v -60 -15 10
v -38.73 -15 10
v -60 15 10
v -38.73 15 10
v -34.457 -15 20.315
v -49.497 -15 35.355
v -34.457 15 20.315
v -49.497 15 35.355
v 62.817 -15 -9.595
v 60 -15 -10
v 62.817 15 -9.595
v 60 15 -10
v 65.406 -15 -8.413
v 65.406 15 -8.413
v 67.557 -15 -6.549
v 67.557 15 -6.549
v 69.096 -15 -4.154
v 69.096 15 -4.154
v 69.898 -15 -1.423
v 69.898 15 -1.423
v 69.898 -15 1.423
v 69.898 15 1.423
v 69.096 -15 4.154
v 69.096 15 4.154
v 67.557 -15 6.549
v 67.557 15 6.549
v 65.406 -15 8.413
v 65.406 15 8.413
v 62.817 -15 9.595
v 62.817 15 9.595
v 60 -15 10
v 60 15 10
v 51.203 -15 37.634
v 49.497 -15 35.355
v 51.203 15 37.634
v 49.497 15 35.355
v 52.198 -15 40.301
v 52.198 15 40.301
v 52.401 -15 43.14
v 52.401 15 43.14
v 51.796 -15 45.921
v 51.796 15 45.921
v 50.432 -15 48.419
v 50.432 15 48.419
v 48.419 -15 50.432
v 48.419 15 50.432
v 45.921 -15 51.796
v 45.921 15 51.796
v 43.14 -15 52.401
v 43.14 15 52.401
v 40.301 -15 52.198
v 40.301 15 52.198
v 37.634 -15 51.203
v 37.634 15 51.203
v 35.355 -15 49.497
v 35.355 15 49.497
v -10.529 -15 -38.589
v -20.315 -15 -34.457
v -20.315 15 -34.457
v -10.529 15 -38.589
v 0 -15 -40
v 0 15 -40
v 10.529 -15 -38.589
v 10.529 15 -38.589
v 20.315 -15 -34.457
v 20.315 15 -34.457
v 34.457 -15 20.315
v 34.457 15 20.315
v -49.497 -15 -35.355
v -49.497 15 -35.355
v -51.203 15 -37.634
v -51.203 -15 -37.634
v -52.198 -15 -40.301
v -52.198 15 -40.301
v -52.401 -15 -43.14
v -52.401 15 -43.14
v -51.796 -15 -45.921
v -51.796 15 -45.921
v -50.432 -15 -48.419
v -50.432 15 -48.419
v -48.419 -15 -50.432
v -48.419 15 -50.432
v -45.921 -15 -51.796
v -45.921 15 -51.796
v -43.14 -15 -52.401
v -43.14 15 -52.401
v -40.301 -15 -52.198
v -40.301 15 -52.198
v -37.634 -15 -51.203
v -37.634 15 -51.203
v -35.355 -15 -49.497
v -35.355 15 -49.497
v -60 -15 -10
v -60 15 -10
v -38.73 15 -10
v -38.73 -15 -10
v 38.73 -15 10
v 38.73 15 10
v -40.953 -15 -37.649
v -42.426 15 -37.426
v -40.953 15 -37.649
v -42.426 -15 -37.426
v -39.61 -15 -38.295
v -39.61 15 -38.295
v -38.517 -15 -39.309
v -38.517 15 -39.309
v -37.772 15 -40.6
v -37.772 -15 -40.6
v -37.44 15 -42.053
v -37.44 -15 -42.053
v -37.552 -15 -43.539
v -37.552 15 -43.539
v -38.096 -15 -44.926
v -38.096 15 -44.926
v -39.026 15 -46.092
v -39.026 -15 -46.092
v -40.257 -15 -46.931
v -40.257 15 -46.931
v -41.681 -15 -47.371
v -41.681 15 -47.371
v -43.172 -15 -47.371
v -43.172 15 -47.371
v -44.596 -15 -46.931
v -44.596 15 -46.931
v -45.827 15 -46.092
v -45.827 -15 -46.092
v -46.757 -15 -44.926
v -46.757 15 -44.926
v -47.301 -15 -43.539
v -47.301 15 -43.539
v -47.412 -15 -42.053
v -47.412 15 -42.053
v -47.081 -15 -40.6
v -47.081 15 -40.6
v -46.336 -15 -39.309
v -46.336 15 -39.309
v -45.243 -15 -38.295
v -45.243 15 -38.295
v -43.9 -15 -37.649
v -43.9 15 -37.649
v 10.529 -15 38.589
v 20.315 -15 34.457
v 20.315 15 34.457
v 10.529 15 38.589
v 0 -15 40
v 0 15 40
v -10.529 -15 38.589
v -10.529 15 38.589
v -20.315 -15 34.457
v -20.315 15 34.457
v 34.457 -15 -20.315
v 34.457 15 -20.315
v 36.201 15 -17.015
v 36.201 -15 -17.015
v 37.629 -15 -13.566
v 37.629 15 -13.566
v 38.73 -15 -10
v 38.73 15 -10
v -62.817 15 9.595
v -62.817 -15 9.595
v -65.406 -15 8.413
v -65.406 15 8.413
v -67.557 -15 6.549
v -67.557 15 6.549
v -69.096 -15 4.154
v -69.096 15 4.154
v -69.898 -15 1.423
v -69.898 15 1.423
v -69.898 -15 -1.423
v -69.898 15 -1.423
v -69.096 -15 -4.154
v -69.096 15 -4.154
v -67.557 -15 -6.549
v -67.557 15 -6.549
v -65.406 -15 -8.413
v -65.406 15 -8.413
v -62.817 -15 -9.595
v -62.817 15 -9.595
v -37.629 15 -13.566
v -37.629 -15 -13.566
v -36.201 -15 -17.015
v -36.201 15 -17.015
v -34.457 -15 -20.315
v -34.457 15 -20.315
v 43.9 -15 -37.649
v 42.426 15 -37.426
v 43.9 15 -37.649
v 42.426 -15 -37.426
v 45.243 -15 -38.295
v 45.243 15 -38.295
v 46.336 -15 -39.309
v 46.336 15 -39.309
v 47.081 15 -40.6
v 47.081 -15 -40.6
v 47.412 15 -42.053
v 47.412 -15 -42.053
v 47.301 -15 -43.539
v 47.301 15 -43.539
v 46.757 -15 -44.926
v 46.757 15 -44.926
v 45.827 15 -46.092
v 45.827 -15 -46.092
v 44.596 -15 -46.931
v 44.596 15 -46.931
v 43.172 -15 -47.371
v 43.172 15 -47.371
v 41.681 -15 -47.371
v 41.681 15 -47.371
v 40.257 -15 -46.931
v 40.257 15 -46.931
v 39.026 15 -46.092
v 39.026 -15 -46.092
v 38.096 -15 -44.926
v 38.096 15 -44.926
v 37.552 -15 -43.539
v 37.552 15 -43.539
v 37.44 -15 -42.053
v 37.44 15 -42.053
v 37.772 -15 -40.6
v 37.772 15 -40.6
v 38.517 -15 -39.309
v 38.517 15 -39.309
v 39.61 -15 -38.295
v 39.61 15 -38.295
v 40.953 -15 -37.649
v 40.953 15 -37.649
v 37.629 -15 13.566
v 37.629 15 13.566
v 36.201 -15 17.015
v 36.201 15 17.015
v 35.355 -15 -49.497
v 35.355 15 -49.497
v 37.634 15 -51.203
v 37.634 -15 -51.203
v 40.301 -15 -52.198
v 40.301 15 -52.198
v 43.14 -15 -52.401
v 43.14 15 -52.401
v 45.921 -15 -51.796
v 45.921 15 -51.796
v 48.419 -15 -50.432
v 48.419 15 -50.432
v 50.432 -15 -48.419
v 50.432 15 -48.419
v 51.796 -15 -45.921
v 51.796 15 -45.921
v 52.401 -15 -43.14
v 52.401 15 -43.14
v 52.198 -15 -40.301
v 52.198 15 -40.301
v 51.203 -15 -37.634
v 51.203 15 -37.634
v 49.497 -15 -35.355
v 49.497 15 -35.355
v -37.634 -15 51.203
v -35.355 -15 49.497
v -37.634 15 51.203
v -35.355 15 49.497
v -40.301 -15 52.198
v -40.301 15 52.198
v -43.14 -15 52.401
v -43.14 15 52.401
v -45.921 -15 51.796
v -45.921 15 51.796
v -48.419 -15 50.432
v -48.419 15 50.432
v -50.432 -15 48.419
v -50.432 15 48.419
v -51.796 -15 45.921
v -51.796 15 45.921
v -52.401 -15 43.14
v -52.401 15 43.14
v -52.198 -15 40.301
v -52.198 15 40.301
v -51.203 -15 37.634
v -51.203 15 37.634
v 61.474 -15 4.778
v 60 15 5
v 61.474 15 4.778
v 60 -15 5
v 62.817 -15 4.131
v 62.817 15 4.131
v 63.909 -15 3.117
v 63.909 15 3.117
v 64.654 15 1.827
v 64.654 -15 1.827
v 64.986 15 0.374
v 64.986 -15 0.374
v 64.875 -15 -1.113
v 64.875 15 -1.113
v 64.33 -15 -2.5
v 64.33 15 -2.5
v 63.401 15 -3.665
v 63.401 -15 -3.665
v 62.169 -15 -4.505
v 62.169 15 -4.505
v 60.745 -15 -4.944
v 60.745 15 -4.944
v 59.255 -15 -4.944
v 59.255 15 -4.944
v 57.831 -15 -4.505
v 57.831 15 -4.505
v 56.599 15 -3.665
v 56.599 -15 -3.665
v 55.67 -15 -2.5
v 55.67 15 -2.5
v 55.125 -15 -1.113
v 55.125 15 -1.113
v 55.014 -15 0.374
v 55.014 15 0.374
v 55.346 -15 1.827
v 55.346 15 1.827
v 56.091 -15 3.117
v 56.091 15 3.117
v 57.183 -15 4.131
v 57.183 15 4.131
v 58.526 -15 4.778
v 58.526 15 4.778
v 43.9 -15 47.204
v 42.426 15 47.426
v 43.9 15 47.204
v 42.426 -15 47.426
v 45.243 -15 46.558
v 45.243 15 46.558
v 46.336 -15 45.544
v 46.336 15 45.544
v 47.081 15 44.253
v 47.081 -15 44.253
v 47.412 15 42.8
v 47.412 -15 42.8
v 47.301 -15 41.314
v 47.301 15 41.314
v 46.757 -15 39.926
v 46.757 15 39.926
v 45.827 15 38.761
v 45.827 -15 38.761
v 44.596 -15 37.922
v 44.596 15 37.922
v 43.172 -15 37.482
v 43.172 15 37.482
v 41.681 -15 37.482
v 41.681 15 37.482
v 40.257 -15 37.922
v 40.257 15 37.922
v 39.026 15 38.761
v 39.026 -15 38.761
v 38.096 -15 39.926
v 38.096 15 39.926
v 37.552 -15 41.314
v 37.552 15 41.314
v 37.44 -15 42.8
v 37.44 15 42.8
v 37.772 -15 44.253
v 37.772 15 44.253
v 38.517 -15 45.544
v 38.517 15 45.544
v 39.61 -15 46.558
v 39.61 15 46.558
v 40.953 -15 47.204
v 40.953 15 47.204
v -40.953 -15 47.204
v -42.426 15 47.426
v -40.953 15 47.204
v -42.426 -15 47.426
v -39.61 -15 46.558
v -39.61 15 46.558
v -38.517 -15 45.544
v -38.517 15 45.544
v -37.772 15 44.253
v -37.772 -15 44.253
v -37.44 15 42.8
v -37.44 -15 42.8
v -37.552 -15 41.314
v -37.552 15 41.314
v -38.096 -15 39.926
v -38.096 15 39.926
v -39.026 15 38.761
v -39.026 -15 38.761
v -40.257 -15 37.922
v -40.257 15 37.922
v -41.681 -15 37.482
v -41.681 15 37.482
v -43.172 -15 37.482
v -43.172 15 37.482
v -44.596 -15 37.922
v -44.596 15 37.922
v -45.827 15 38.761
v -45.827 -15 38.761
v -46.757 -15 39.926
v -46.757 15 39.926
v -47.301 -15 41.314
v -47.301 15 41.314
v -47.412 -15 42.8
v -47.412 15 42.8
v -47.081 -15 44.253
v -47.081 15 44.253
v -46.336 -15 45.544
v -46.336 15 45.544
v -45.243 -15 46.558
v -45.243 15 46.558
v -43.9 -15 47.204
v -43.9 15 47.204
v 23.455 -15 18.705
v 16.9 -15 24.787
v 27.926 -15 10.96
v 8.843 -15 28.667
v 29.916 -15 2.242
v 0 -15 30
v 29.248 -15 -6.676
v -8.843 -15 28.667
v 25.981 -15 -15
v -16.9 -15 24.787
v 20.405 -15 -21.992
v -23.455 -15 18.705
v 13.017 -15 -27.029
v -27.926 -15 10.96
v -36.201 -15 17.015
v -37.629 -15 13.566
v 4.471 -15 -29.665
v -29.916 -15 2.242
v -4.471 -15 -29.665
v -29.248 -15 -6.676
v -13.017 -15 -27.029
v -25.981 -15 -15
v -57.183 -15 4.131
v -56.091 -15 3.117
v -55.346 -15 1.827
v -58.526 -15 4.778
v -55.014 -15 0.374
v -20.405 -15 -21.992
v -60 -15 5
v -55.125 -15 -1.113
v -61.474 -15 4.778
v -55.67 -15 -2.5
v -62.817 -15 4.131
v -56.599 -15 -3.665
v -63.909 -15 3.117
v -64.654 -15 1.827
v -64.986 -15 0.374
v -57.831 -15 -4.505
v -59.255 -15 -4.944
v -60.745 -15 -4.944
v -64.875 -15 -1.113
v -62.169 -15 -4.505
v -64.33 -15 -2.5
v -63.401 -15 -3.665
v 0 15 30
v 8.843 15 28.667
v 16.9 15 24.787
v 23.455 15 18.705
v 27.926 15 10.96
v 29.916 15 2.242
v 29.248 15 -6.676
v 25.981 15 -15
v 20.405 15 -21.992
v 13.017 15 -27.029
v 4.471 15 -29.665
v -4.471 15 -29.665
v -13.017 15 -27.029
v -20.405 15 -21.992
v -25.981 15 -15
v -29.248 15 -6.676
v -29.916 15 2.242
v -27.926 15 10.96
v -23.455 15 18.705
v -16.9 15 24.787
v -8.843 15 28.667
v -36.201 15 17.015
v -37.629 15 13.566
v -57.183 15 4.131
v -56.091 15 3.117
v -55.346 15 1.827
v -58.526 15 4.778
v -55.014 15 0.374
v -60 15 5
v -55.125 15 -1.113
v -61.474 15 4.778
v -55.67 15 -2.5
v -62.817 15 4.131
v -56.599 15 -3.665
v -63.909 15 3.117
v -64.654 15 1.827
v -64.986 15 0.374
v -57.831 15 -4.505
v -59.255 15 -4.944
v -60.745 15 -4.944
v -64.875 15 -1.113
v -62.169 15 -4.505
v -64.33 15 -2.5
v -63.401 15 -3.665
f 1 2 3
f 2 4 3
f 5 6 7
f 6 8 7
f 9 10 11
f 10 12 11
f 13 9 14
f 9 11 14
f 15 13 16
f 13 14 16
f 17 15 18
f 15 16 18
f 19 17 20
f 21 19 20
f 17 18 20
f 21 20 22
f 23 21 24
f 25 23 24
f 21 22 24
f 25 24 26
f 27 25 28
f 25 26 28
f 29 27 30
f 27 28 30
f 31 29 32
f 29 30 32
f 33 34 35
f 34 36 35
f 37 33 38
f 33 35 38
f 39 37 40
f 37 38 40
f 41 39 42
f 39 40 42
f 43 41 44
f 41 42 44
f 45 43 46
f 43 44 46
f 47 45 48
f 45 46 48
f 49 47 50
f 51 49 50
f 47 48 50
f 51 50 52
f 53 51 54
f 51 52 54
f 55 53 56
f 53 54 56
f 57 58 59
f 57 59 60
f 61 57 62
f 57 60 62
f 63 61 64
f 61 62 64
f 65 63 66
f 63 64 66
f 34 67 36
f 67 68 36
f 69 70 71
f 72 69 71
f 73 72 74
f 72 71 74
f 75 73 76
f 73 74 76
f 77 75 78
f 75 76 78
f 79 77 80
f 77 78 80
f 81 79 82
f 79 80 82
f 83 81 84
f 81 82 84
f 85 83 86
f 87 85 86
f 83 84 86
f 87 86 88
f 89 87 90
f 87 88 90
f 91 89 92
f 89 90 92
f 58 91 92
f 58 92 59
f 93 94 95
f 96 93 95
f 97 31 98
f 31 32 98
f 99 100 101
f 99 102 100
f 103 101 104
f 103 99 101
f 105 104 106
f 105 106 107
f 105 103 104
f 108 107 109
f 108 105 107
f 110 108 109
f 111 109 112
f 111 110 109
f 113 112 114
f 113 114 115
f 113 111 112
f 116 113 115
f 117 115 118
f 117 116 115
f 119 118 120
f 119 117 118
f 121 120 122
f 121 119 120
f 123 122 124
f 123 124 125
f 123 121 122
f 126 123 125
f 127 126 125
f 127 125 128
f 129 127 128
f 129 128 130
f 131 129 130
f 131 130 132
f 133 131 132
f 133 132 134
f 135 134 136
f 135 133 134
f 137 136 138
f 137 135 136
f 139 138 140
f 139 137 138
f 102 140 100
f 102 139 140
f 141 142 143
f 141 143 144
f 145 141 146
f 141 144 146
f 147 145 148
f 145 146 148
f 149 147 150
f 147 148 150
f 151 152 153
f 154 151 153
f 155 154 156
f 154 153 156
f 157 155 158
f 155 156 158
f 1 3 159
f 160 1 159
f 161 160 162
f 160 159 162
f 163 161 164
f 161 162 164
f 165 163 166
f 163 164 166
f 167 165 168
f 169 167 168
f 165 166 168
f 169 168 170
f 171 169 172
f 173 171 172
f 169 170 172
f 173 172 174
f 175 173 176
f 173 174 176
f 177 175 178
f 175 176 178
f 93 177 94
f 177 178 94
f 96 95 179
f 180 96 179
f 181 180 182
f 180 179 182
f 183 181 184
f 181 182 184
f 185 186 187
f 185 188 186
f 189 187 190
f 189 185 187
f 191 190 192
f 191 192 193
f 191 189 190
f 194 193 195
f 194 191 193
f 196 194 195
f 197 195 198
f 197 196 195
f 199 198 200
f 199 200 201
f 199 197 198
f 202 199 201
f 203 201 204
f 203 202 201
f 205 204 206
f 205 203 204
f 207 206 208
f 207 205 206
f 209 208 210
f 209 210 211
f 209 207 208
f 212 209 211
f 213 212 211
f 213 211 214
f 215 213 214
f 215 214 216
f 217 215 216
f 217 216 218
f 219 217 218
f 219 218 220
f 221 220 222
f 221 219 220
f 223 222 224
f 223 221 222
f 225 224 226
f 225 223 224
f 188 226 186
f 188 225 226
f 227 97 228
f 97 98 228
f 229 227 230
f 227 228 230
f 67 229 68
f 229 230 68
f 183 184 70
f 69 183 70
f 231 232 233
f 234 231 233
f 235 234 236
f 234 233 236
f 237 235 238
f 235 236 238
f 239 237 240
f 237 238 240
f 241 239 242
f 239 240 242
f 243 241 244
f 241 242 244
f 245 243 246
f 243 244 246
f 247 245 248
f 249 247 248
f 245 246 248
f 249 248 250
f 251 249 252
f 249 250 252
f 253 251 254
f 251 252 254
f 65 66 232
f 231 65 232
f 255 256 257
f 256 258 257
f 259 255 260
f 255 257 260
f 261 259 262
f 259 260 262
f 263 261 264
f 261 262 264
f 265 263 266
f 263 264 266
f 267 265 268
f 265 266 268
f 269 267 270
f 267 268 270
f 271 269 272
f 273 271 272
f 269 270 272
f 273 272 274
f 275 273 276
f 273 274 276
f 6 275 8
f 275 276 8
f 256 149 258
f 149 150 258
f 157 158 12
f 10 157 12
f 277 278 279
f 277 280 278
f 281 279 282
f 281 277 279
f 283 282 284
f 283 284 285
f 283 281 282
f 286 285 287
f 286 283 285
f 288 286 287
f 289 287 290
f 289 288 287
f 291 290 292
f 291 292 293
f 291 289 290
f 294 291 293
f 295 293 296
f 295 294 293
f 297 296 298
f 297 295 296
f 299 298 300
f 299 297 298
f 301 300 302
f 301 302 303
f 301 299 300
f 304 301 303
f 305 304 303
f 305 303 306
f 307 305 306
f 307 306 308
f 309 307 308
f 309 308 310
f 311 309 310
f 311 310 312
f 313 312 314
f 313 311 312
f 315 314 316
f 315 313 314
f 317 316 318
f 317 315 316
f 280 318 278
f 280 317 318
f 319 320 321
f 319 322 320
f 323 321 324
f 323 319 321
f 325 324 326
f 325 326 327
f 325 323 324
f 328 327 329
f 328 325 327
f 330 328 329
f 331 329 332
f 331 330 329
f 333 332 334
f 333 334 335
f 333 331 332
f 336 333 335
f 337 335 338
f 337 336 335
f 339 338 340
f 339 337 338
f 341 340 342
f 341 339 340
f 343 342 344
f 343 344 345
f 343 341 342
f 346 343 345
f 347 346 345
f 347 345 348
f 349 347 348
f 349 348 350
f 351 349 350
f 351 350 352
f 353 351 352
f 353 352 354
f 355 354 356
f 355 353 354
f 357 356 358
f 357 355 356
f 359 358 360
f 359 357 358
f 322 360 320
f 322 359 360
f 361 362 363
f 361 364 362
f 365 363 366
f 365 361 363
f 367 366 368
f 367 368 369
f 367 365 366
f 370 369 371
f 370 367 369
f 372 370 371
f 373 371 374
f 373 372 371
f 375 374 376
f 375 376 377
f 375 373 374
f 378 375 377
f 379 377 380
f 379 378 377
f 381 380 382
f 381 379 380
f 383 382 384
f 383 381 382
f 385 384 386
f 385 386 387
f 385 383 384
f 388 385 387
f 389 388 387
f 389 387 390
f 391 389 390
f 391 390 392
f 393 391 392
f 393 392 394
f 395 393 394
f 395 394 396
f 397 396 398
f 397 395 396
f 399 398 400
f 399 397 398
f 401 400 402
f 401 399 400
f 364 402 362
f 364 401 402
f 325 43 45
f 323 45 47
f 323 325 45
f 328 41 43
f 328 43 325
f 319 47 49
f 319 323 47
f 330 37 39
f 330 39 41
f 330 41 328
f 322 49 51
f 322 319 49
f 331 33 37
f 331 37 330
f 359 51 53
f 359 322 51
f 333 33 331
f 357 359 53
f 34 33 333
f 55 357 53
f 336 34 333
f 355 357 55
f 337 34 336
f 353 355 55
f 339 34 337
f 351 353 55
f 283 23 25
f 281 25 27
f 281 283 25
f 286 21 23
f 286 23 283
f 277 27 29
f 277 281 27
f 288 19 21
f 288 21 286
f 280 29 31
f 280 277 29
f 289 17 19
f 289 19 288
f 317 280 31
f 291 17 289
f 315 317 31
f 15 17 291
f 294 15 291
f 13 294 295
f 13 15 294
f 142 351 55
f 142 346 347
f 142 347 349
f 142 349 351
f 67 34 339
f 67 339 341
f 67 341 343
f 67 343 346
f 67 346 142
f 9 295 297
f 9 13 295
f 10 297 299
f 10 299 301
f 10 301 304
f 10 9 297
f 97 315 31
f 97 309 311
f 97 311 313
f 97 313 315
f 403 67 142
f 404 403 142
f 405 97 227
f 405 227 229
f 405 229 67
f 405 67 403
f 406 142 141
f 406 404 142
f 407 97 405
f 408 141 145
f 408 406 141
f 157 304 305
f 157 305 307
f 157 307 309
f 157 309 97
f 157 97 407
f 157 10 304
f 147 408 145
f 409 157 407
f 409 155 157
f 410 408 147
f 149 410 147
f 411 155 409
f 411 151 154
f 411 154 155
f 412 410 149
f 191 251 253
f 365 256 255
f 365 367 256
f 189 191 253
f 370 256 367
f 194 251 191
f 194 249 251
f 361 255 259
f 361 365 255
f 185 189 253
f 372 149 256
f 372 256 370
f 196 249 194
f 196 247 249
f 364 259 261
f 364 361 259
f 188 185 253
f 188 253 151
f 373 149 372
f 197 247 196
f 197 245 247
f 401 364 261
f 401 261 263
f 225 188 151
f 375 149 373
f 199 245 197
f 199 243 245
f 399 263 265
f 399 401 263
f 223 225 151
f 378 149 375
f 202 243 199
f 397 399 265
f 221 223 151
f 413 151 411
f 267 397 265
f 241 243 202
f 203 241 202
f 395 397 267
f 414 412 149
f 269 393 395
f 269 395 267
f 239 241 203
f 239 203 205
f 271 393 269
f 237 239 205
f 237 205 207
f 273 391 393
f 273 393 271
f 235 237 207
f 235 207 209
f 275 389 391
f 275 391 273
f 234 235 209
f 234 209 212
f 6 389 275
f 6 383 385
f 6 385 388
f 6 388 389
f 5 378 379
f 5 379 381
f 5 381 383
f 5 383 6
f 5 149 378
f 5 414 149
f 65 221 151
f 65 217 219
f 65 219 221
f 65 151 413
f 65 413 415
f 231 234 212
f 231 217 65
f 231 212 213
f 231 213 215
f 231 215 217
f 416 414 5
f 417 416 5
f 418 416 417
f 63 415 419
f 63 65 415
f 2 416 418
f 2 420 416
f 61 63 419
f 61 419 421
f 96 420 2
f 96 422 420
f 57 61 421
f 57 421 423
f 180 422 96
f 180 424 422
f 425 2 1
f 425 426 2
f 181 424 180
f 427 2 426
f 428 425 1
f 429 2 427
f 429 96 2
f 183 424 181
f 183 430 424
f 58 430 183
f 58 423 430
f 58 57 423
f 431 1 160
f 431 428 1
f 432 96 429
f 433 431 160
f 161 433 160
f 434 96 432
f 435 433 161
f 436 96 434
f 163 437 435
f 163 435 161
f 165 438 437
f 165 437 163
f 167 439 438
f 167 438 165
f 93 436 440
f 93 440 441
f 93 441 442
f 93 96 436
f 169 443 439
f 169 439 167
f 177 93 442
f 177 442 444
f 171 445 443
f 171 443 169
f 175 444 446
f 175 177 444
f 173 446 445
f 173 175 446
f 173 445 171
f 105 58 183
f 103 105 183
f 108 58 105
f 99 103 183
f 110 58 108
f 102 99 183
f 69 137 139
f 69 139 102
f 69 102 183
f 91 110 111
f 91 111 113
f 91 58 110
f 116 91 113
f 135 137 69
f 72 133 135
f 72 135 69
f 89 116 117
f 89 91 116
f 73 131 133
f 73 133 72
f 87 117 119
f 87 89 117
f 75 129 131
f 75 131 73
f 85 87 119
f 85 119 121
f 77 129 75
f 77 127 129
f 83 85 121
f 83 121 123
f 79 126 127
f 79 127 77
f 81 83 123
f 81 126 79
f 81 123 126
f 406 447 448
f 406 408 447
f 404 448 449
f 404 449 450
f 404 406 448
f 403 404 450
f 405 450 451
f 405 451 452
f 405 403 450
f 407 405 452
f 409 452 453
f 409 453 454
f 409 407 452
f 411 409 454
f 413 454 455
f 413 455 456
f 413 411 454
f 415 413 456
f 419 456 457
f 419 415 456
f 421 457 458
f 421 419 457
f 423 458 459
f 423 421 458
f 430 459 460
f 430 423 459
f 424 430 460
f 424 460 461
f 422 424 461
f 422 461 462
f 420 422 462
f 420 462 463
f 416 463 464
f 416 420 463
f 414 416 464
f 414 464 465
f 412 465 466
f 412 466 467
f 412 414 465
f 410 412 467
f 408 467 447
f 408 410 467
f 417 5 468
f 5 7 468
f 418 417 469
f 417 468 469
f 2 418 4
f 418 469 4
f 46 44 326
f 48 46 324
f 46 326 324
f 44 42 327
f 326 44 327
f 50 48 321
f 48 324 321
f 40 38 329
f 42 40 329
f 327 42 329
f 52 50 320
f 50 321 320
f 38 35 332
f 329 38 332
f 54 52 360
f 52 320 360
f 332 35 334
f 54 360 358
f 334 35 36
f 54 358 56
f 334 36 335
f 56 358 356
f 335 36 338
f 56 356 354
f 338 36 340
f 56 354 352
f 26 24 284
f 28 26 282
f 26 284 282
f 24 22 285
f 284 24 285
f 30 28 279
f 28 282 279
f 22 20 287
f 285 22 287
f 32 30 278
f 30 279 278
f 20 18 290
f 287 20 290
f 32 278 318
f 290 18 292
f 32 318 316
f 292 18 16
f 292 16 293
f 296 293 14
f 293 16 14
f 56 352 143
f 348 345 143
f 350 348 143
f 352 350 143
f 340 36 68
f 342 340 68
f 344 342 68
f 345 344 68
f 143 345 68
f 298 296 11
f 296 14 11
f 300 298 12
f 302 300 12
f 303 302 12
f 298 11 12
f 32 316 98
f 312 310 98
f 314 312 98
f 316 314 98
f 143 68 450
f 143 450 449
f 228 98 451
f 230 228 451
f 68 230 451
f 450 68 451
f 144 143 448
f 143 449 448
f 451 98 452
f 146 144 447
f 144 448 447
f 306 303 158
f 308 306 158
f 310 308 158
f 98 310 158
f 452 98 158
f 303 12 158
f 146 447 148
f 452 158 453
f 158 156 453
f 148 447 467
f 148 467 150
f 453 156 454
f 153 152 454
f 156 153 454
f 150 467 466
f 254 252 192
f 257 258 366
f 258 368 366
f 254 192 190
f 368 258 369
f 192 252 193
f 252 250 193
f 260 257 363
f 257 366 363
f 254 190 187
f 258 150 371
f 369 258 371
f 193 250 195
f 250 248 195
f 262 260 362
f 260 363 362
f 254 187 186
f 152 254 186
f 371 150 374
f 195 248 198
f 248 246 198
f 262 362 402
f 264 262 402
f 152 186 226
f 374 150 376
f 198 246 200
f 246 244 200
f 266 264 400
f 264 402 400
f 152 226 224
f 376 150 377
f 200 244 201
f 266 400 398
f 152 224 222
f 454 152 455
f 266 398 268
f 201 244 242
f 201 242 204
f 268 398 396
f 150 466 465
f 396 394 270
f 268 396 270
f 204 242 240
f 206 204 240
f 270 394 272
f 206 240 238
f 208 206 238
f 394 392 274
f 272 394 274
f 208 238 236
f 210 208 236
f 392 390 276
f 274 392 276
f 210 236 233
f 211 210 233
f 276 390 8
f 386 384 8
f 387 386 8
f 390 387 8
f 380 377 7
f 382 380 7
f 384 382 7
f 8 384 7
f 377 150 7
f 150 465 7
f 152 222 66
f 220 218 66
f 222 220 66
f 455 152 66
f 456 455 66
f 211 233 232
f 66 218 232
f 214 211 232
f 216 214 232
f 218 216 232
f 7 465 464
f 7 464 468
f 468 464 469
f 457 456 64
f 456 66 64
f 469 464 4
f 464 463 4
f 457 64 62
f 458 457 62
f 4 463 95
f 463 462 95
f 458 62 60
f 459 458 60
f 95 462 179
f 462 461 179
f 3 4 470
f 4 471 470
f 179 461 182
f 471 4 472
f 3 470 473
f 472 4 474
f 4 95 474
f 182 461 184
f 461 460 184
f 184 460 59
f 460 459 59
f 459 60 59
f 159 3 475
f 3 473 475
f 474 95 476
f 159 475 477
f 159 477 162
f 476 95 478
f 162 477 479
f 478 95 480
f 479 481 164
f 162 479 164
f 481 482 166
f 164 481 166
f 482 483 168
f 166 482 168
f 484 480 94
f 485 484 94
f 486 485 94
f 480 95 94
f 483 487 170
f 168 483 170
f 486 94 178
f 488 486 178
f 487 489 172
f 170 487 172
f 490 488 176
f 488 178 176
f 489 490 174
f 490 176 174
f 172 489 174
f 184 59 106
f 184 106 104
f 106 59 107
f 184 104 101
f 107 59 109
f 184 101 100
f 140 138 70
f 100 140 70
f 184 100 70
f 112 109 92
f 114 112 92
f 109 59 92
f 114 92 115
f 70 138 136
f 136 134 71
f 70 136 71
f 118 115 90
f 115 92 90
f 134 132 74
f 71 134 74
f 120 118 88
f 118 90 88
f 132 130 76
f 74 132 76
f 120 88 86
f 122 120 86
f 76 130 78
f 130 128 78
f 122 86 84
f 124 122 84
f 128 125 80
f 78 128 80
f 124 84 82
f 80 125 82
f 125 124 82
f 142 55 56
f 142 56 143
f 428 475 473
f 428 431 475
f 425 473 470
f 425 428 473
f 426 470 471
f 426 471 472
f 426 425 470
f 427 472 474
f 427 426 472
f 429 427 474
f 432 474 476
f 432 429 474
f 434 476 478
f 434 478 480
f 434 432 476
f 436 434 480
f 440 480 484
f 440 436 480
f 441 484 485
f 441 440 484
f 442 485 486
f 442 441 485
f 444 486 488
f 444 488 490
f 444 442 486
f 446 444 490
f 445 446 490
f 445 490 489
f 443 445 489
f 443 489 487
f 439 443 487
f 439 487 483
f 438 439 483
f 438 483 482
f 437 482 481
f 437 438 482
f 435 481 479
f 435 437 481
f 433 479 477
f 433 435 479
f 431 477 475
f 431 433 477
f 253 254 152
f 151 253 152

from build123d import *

# Parameters (mm, degrees)
SKETCH2_R           = 30
SKETCH2_R_2         = 5
BOSS_EXTRUDE1_DEPTH = 15


with BuildPart() as part:
    # Sketch2 → Boss-Extrude1 (new, symmetric)
    with BuildSketch(Plane(origin=(0, 0, 0), x_dir=(1, 0, 0), z_dir=(0, 1, 0))):
        with BuildLine():
            Line((38.729833462, 10), (60, 10))
            ThreePointArc((60, 10), (70, 0), (60, -10))
            Line((60, -10), (38.729833462, -10))
            ThreePointArc((38.729833462, -10), (36.9551813, -15.307337295), (34.457195687, -20.315060063))
            Line((34.457195687, -20.315060063), (49.497474683, -35.355339059))
            ThreePointArc((49.497474683, -35.355339059), (49.497474683, -49.497474683), (35.355339059, -49.497474683))
            Line((35.355339059, -49.497474683), (20.315060063, -34.457195687))
            ThreePointArc((20.315060063, -34.457195687), (0, -40), (-20.315060063, -34.457195687))
            Line((-20.315060063, -34.457195687), (-35.355339059, -49.497474683))
            ThreePointArc((-35.355339059, -49.497474683), (-49.497474683, -49.497474683), (-49.497474683, -35.355339059))
            Line((-49.497474683, -35.355339059), (-34.457195687, -20.315060063))
            ThreePointArc((-34.457195687, -20.315060063), (-36.9551813, -15.307337295), (-38.729833462, -10))
            Line((-38.729833462, -10), (-60, -10))
            ThreePointArc((-60, -10), (-70, 0), (-60, 10))
            Line((-60, 10), (-38.729833462, 10))
            ThreePointArc((-38.729833462, 10), (-36.9551813, 15.307337295), (-34.457195687, 20.315060063))
            Line((-34.457195687, 20.315060063), (-49.497474683, 35.355339059))
            ThreePointArc((-49.497474683, 35.355339059), (-49.497474683, 49.497474683), (-35.355339059, 49.497474683))
            Line((-35.355339059, 49.497474683), (-20.315060063, 34.457195687))
            ThreePointArc((-20.315060063, 34.457195687), (0, 40), (20.315060063, 34.457195687))
            Line((20.315060063, 34.457195687), (35.355339059, 49.497474683))
            ThreePointArc((35.355339059, 49.497474683), (49.497474683, 49.497474683), (49.497474683, 35.355339059))
            Line((49.497474683, 35.355339059), (34.457195687, 20.315060063))
            ThreePointArc((34.457195687, 20.315060063), (36.9551813, 15.307337295), (38.729833462, 10))
        make_face()
        with Locations(Location((0, 0, 0), (0, 0, 270))):
            Circle(SKETCH2_R, mode=Mode.SUBTRACT)
        with Locations(Location((60, 0, 0), (0, 0, 270))):
            Circle(SKETCH2_R_2, mode=Mode.SUBTRACT)
        with Locations(Location((42.426406871, -42.426406871, 0), (0, 0, 270))):
            Circle(SKETCH2_R_2, mode=Mode.SUBTRACT)
        with Locations(Location((-42.426406871, -42.426406871, 0), (0, 0, 270))):
            Circle(SKETCH2_R_2, mode=Mode.SUBTRACT)
        with Locations(Location((-60, 0, 0), (0, 0, 270))):
            Circle(SKETCH2_R_2, mode=Mode.SUBTRACT)
        with Locations(Location((-42.426406871, 42.426406871, 0), (0, 0, 270))):
            Circle(SKETCH2_R_2, mode=Mode.SUBTRACT)
        with Locations(Location((42.426406871, 42.426406871, 0), (0, 0, 270))):
            Circle(SKETCH2_R_2, mode=Mode.SUBTRACT)
    extrude(amount=BOSS_EXTRUDE1_DEPTH, both=True)


solid = part.part
